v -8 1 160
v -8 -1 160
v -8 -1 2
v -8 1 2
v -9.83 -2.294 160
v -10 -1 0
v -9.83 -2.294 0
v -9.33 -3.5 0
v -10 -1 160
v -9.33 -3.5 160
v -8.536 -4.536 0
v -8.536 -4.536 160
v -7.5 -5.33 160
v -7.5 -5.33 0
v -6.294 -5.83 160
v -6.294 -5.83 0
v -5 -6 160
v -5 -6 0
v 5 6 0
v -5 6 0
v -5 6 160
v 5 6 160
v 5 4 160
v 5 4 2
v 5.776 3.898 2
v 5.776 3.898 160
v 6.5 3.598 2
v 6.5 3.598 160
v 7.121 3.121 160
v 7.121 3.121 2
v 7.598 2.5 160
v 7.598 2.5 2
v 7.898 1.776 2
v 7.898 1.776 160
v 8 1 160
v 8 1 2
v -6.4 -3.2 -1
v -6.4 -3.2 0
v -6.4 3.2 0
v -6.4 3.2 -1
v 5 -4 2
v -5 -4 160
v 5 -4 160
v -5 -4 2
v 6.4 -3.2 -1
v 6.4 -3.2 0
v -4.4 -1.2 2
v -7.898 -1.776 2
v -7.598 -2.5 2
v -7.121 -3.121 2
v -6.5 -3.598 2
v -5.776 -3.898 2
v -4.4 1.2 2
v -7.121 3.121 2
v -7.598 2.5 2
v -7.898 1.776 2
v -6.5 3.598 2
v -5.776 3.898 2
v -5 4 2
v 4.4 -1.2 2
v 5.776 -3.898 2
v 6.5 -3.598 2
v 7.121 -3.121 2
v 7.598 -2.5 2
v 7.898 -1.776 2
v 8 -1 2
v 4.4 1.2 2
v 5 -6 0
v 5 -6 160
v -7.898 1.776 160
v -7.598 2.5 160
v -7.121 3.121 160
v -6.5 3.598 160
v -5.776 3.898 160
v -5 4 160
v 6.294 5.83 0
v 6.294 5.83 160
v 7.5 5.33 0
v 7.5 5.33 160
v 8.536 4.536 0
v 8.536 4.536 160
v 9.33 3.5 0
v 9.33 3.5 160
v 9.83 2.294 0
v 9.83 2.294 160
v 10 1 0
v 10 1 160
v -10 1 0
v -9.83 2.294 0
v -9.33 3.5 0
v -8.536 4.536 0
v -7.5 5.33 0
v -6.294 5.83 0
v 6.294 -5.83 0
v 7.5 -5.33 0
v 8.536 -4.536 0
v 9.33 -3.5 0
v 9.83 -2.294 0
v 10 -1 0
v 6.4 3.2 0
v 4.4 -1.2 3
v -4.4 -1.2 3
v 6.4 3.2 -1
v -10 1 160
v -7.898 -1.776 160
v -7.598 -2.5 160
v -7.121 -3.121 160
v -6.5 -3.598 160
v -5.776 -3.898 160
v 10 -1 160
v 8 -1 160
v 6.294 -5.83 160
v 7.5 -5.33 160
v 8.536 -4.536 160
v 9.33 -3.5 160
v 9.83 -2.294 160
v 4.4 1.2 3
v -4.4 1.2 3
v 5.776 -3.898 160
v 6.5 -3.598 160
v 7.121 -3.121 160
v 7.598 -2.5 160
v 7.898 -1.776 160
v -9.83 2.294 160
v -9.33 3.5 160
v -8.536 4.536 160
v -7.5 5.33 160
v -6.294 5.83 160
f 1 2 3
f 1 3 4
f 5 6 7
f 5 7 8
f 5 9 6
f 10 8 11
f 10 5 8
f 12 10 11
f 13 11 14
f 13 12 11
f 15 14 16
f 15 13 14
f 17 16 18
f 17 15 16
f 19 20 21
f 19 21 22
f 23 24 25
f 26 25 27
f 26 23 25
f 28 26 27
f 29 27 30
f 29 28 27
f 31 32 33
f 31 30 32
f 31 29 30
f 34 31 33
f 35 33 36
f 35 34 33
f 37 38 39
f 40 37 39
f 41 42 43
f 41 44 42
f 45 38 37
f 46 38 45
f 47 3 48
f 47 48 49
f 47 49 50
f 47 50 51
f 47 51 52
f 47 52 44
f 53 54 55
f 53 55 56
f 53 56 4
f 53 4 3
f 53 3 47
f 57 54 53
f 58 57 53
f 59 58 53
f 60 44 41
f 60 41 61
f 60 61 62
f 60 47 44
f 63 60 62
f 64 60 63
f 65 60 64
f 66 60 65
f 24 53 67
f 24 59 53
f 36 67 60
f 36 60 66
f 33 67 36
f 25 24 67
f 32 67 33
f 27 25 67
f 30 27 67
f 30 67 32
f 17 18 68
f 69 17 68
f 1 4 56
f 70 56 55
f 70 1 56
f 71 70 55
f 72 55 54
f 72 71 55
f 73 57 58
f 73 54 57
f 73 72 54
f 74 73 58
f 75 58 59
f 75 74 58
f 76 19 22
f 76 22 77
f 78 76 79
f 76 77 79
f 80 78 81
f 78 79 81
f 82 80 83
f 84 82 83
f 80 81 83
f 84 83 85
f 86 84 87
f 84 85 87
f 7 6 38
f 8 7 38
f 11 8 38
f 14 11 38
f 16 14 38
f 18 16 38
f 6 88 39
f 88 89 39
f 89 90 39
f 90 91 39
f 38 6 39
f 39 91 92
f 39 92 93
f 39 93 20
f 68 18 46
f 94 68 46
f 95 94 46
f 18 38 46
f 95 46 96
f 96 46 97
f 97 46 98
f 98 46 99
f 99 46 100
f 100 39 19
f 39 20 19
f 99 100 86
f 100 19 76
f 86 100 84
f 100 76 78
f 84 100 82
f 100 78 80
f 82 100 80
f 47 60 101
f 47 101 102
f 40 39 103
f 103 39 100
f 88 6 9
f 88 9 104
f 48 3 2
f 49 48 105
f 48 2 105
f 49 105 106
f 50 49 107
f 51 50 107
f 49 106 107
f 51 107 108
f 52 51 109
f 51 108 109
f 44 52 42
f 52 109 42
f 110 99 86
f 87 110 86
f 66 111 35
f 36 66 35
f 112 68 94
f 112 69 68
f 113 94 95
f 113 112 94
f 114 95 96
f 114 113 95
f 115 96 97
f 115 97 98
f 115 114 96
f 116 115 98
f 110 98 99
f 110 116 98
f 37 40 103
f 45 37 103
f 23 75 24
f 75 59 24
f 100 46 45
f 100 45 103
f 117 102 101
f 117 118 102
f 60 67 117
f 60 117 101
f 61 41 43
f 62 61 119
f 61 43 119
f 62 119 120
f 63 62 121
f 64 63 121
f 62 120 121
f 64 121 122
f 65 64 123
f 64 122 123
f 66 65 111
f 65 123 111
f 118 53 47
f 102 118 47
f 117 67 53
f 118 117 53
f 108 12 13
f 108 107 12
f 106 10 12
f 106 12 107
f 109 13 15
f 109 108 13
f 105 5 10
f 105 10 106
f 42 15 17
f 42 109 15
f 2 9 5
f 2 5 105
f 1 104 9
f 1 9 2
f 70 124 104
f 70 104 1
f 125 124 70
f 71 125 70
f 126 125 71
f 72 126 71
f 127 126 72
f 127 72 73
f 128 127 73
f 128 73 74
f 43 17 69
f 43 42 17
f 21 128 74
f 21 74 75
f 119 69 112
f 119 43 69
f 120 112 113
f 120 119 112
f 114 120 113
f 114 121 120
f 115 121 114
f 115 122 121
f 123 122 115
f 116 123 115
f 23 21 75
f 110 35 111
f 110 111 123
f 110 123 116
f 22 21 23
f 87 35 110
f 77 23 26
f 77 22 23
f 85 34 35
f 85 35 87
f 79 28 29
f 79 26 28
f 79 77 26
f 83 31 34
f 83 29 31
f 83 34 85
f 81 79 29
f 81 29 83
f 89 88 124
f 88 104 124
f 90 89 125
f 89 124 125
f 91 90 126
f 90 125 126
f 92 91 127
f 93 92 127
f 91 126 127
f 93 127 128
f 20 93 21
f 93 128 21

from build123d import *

# Parameters (mm, degrees)
F0_W     = 12.8
F0_H     = 6.4
F1_DEPTH = 1
F0_W_2   = 20
F0_H_2   = 12
F2_DEPTH = 160
F3_R     = 5
F4_T     = -2
F5_DEPTH = 2


with BuildPart() as f1:
    # F0 (on Top) → F1 (new body)
    with BuildSketch(Plane.XY):
        Rectangle(F0_W, F0_H)
    extrude(amount=-F1_DEPTH)

    # F0 (on Top) → F2 (join)
    with BuildSketch(Plane.XY):
        Rectangle(F0_W_2, F0_H_2)
        Rectangle(F0_W, F0_H, mode=Mode.SUBTRACT)
        Rectangle(F0_W, F0_H)
    extrude(amount=F2_DEPTH)

    # F3
    f3_edges = [f1.edges().sort_by_distance(p)[0] for p in [
        (-10, -6, 80),
        (10, -6, 80),
        (10, 6, 80),
        (-10, 6, 80),
    ]]
    fillet(f3_edges, radius=F3_R)

    # F4
    f4_openings = [f1.faces().sort_by_distance(p)[0] for p in [
        (0, 0, 160),
    ]]
    offset(amount=F4_T, openings=f4_openings, kind=Kind.INTERSECTION)

    # F5 (add): a face of the model
    f5_faces = [f1.faces().sort_by_distance(p)[0] for p in [
        (0, 0, 1),
    ]]
    extrude(f5_faces, amount=F5_DEPTH)


solid = f1.part
